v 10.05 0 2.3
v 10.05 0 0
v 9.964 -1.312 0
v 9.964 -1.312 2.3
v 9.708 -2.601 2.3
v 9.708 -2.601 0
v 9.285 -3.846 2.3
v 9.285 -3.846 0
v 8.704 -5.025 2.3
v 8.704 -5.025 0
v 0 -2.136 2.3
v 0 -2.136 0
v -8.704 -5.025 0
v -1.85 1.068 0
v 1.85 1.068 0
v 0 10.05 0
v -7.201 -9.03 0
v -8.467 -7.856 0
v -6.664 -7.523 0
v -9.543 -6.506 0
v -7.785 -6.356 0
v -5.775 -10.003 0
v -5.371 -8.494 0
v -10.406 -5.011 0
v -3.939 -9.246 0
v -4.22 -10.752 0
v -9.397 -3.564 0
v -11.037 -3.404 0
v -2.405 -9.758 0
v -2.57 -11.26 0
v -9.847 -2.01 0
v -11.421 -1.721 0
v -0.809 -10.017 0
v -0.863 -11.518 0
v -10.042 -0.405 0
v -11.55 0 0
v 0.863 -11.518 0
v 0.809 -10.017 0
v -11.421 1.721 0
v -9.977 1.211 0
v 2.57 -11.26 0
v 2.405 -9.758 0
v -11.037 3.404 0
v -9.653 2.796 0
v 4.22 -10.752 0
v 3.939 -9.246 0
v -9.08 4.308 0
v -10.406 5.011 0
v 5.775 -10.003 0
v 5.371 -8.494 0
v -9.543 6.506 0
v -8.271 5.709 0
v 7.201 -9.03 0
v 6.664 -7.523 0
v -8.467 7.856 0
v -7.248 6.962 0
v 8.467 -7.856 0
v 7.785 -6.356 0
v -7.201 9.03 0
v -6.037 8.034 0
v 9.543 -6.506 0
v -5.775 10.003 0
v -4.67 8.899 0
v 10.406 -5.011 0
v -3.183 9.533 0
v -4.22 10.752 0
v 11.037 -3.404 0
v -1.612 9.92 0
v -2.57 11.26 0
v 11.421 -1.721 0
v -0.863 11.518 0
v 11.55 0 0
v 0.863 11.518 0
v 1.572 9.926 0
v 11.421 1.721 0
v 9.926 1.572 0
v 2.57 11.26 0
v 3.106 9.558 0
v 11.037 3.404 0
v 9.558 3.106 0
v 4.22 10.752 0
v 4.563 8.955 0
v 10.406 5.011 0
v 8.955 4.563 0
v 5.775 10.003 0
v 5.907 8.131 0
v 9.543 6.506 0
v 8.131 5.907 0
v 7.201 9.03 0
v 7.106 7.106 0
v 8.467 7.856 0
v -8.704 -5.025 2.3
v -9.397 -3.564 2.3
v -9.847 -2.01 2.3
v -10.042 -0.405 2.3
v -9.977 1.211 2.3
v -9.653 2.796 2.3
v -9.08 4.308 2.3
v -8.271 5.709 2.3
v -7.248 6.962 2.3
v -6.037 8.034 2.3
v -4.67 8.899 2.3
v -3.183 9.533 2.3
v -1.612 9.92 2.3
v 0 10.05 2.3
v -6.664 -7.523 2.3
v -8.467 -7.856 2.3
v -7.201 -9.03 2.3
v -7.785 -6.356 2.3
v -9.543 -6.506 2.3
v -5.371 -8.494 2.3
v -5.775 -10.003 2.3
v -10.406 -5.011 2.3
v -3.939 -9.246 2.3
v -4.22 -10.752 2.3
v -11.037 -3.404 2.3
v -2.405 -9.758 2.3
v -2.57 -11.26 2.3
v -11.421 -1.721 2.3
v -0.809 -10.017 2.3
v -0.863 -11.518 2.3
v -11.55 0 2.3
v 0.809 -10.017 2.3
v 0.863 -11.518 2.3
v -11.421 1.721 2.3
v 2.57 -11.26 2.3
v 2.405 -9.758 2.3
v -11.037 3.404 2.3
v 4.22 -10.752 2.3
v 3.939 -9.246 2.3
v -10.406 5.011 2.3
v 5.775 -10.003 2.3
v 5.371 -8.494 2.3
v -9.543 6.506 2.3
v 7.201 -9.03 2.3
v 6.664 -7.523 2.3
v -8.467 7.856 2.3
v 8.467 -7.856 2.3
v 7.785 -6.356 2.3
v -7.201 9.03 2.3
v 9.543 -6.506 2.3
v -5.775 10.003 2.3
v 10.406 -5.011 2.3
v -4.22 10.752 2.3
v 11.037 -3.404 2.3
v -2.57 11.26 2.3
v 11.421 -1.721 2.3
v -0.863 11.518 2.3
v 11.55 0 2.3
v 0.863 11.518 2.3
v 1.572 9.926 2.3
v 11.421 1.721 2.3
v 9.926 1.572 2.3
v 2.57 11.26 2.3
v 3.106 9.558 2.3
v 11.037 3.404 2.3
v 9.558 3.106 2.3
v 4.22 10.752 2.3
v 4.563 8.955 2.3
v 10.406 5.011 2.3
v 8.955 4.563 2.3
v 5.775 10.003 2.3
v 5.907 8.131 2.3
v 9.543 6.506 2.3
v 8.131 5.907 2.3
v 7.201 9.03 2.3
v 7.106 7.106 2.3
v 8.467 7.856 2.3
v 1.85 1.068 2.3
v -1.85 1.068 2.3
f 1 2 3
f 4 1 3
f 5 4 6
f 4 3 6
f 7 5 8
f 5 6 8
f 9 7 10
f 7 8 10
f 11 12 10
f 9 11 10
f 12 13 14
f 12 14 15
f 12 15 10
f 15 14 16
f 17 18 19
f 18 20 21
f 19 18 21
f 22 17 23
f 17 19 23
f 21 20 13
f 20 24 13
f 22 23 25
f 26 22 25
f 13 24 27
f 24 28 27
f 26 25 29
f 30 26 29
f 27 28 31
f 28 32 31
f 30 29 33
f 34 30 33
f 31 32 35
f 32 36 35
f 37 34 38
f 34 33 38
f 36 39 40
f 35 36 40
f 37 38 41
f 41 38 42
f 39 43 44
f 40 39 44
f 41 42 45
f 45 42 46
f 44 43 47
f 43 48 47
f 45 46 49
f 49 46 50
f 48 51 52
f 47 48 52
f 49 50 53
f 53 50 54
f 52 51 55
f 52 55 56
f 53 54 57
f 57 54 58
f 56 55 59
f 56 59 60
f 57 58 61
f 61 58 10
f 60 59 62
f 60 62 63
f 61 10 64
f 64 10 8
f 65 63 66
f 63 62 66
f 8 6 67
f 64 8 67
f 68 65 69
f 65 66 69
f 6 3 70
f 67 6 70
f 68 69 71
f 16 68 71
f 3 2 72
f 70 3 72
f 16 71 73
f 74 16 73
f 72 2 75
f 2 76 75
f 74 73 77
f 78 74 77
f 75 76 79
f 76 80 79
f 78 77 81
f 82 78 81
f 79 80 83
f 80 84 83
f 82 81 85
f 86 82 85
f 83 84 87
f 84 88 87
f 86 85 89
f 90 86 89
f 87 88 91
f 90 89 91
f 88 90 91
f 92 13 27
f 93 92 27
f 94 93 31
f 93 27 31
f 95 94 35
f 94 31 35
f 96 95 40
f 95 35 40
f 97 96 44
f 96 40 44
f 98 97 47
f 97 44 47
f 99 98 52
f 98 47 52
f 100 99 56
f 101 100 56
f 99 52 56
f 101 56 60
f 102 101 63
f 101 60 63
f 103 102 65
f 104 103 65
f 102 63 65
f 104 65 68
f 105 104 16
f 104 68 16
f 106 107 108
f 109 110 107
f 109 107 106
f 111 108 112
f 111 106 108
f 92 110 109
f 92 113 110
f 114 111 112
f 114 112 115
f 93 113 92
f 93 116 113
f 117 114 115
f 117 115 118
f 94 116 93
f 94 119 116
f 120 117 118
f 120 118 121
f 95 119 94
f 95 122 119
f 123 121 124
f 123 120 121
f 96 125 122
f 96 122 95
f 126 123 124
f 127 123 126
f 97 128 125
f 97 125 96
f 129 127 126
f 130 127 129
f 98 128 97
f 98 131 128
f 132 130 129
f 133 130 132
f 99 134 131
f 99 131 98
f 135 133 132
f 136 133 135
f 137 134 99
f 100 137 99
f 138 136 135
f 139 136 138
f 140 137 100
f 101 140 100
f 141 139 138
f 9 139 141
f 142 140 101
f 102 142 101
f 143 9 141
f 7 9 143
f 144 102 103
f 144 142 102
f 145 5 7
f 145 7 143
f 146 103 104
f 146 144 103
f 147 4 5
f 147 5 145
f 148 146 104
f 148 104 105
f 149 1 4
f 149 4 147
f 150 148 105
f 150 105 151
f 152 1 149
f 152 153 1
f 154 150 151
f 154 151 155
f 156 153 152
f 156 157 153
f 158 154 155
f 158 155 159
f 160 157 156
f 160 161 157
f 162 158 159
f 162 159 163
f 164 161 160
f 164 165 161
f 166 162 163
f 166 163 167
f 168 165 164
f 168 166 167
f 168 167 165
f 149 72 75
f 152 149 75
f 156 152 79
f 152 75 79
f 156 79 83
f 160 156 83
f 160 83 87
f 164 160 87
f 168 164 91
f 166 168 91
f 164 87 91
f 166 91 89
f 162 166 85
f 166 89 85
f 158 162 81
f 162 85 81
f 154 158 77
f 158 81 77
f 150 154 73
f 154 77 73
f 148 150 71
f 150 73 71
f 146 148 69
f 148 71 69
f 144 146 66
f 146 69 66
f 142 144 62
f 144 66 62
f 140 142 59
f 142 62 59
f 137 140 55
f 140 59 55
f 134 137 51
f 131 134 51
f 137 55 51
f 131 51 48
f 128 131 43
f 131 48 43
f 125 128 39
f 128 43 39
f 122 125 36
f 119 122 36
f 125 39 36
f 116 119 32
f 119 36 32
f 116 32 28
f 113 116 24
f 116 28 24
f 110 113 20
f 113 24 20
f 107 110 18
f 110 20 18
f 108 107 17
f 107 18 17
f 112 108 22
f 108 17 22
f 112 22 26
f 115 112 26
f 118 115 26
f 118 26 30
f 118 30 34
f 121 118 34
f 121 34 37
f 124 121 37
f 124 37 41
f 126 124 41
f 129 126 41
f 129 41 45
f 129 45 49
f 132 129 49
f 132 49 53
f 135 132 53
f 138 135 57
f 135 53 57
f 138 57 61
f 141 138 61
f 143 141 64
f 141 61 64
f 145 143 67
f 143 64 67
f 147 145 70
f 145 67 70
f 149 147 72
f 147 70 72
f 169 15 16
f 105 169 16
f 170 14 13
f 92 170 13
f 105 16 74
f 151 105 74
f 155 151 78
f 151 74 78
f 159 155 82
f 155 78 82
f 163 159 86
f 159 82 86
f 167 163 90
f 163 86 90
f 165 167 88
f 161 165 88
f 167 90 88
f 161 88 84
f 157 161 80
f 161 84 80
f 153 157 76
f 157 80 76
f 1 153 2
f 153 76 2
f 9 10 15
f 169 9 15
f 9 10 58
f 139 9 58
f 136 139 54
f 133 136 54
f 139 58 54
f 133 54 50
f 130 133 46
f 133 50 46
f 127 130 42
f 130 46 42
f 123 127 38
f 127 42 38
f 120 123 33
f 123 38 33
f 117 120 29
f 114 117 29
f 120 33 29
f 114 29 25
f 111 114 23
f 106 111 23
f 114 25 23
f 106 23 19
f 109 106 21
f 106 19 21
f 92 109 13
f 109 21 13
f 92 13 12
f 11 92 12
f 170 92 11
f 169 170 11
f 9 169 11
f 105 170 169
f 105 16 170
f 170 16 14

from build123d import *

# Parameters (mm, degrees)
F0_R     = 11.55
F1_DEPTH = 2.3


with BuildPart() as f1:
    # F0 (on Top) → F1 (new body)
    with BuildSketch(Plane.XY):
        Circle(F0_R)
        with BuildLine():
            ThreePointArc((0, 10.05), (7.106423, 7.106423), (10.05, 0))
            ThreePointArc((10.05, 0), (9.707555, -2.601131), (8.703555, -5.025))
            ThreePointArc((8.703555, -5.025), (0, -10.05), (-8.703555, -5.025))
            ThreePointArc((-8.703555, -5.025), (-8.703555, 5.025), (0, 10.05))
        make_face(mode=Mode.SUBTRACT)
        Polygon((1.85, 1.068098), (0, 10.05), (-1.85, 1.068098), (-8.703555, -5.025), (0, -2.136196), (8.703555, -5.025), align=None)
    extrude(amount=F1_DEPTH)


solid = f1.part
